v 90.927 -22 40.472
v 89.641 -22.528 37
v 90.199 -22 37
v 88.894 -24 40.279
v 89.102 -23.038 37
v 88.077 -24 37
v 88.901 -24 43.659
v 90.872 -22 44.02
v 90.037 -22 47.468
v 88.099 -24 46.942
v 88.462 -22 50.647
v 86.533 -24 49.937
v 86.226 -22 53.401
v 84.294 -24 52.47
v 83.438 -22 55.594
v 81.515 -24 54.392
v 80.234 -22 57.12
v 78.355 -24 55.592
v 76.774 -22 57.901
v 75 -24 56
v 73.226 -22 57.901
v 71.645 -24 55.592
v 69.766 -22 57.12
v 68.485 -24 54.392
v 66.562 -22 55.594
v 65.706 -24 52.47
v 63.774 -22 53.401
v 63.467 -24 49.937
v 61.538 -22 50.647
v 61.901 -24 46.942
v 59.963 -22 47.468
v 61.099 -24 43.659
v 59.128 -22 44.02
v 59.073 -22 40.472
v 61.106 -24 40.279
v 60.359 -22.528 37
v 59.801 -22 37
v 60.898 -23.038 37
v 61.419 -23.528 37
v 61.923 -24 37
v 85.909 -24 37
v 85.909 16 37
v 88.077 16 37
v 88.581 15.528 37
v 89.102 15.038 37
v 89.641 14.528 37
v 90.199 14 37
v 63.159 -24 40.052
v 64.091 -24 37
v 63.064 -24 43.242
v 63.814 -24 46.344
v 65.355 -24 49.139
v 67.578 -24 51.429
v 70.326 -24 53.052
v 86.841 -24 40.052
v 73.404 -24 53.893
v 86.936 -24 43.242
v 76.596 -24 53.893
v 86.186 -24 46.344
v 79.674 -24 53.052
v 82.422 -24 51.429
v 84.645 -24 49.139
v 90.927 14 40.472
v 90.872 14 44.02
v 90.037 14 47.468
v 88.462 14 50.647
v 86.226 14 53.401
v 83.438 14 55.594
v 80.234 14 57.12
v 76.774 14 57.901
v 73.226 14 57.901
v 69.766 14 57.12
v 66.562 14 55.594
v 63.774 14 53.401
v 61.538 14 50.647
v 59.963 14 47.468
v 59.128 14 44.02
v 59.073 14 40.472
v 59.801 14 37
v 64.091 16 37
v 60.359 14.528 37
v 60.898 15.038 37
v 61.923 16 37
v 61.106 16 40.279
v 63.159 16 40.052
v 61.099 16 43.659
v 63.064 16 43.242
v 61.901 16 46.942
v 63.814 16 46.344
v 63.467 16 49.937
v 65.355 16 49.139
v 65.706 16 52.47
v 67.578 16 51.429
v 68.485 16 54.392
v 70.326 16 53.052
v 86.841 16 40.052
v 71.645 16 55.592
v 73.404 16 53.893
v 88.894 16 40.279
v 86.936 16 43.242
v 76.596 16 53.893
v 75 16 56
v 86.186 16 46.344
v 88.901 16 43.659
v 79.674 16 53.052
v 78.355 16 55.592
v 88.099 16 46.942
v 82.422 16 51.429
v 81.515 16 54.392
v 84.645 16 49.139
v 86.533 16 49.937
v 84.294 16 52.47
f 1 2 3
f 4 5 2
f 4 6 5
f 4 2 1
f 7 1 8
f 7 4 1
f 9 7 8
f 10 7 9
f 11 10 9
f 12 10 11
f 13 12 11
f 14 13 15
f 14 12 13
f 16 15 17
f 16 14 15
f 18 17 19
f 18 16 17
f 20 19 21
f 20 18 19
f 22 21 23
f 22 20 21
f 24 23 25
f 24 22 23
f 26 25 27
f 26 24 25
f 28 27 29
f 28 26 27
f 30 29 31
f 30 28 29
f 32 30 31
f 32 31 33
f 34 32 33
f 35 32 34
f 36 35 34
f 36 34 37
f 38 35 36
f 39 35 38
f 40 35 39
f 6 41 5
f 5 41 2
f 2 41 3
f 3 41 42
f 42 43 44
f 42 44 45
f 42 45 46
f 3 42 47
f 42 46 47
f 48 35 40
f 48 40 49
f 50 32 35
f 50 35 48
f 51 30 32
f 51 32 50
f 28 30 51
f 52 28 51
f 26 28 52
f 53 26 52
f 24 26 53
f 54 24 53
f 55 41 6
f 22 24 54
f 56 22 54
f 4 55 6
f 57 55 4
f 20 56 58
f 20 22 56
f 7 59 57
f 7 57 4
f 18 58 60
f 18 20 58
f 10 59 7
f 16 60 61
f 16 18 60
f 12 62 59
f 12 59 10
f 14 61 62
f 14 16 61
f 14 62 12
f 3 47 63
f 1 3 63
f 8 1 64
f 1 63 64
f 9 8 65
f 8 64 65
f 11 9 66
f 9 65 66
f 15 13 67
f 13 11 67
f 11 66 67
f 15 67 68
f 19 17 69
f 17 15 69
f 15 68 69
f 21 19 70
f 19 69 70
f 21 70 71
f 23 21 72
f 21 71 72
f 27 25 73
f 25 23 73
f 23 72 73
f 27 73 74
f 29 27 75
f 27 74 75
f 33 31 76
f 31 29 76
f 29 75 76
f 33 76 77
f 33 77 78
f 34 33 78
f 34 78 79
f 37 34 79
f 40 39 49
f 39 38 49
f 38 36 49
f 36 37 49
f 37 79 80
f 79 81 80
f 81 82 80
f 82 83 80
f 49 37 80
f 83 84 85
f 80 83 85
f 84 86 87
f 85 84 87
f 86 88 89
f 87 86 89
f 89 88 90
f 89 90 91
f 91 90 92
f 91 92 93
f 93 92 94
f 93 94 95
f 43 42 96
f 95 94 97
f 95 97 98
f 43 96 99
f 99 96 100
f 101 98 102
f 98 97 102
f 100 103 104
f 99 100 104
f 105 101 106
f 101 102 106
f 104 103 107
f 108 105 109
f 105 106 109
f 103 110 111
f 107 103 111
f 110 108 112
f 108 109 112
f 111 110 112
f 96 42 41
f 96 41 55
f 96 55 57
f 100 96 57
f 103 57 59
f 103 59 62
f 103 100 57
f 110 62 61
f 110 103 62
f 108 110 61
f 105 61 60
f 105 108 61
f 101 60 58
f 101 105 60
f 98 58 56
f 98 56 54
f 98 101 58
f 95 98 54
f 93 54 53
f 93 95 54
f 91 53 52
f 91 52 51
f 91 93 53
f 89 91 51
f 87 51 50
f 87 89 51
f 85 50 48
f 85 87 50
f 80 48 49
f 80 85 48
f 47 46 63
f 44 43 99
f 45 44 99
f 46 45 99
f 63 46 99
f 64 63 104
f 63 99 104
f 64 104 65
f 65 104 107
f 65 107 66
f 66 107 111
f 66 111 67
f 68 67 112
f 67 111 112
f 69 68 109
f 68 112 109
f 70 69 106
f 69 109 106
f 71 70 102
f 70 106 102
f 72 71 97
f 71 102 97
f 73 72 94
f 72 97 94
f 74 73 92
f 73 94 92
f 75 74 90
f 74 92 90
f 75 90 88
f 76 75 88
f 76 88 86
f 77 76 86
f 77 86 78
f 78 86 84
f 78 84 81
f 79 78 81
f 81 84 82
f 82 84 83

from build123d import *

# Parameters (mm, degrees)
BOX713_W        = 100
BOX713_H        = 100
BOX713_DEPTH    = 100
TUBE_R          = 16
TUBE_R_2        = 12
TUBE_DEPTH      = 40
CHAMFER002_SIZE = 2


with BuildPart() as krychle713:
    # Box713 → Box713 (new body)
    with BuildSketch(Plane(origin=(32, -54, -63), x_dir=(1, 0, 0), z_dir=(0, 0, 1))):
        with Locations((50, 50)):
            Rectangle(BOX713_W, BOX713_H)
    extrude(amount=BOX713_DEPTH)


with BuildPart() as cut530:
    # Tube → Tube (new body)
    with BuildSketch(Plane(origin=(75, 16, 42), x_dir=(1, 0, 0), z_dir=(0, -1, 0))):
        Circle(TUBE_R)
        Circle(TUBE_R_2, mode=Mode.SUBTRACT)
    extrude(amount=TUBE_DEPTH)

    # Chamfer002
    chamfer002_edges = [cut530.edges().sort_by_distance(p)[0] for p in [
        (59, -24, 42),
        (59, 16, 42),
    ]]
    chamfer(chamfer002_edges, length=CHAMFER002_SIZE)

    # Cut530: cut Krychle713
    add(krychle713.part, mode=Mode.SUBTRACT)


solid = cut530.part
